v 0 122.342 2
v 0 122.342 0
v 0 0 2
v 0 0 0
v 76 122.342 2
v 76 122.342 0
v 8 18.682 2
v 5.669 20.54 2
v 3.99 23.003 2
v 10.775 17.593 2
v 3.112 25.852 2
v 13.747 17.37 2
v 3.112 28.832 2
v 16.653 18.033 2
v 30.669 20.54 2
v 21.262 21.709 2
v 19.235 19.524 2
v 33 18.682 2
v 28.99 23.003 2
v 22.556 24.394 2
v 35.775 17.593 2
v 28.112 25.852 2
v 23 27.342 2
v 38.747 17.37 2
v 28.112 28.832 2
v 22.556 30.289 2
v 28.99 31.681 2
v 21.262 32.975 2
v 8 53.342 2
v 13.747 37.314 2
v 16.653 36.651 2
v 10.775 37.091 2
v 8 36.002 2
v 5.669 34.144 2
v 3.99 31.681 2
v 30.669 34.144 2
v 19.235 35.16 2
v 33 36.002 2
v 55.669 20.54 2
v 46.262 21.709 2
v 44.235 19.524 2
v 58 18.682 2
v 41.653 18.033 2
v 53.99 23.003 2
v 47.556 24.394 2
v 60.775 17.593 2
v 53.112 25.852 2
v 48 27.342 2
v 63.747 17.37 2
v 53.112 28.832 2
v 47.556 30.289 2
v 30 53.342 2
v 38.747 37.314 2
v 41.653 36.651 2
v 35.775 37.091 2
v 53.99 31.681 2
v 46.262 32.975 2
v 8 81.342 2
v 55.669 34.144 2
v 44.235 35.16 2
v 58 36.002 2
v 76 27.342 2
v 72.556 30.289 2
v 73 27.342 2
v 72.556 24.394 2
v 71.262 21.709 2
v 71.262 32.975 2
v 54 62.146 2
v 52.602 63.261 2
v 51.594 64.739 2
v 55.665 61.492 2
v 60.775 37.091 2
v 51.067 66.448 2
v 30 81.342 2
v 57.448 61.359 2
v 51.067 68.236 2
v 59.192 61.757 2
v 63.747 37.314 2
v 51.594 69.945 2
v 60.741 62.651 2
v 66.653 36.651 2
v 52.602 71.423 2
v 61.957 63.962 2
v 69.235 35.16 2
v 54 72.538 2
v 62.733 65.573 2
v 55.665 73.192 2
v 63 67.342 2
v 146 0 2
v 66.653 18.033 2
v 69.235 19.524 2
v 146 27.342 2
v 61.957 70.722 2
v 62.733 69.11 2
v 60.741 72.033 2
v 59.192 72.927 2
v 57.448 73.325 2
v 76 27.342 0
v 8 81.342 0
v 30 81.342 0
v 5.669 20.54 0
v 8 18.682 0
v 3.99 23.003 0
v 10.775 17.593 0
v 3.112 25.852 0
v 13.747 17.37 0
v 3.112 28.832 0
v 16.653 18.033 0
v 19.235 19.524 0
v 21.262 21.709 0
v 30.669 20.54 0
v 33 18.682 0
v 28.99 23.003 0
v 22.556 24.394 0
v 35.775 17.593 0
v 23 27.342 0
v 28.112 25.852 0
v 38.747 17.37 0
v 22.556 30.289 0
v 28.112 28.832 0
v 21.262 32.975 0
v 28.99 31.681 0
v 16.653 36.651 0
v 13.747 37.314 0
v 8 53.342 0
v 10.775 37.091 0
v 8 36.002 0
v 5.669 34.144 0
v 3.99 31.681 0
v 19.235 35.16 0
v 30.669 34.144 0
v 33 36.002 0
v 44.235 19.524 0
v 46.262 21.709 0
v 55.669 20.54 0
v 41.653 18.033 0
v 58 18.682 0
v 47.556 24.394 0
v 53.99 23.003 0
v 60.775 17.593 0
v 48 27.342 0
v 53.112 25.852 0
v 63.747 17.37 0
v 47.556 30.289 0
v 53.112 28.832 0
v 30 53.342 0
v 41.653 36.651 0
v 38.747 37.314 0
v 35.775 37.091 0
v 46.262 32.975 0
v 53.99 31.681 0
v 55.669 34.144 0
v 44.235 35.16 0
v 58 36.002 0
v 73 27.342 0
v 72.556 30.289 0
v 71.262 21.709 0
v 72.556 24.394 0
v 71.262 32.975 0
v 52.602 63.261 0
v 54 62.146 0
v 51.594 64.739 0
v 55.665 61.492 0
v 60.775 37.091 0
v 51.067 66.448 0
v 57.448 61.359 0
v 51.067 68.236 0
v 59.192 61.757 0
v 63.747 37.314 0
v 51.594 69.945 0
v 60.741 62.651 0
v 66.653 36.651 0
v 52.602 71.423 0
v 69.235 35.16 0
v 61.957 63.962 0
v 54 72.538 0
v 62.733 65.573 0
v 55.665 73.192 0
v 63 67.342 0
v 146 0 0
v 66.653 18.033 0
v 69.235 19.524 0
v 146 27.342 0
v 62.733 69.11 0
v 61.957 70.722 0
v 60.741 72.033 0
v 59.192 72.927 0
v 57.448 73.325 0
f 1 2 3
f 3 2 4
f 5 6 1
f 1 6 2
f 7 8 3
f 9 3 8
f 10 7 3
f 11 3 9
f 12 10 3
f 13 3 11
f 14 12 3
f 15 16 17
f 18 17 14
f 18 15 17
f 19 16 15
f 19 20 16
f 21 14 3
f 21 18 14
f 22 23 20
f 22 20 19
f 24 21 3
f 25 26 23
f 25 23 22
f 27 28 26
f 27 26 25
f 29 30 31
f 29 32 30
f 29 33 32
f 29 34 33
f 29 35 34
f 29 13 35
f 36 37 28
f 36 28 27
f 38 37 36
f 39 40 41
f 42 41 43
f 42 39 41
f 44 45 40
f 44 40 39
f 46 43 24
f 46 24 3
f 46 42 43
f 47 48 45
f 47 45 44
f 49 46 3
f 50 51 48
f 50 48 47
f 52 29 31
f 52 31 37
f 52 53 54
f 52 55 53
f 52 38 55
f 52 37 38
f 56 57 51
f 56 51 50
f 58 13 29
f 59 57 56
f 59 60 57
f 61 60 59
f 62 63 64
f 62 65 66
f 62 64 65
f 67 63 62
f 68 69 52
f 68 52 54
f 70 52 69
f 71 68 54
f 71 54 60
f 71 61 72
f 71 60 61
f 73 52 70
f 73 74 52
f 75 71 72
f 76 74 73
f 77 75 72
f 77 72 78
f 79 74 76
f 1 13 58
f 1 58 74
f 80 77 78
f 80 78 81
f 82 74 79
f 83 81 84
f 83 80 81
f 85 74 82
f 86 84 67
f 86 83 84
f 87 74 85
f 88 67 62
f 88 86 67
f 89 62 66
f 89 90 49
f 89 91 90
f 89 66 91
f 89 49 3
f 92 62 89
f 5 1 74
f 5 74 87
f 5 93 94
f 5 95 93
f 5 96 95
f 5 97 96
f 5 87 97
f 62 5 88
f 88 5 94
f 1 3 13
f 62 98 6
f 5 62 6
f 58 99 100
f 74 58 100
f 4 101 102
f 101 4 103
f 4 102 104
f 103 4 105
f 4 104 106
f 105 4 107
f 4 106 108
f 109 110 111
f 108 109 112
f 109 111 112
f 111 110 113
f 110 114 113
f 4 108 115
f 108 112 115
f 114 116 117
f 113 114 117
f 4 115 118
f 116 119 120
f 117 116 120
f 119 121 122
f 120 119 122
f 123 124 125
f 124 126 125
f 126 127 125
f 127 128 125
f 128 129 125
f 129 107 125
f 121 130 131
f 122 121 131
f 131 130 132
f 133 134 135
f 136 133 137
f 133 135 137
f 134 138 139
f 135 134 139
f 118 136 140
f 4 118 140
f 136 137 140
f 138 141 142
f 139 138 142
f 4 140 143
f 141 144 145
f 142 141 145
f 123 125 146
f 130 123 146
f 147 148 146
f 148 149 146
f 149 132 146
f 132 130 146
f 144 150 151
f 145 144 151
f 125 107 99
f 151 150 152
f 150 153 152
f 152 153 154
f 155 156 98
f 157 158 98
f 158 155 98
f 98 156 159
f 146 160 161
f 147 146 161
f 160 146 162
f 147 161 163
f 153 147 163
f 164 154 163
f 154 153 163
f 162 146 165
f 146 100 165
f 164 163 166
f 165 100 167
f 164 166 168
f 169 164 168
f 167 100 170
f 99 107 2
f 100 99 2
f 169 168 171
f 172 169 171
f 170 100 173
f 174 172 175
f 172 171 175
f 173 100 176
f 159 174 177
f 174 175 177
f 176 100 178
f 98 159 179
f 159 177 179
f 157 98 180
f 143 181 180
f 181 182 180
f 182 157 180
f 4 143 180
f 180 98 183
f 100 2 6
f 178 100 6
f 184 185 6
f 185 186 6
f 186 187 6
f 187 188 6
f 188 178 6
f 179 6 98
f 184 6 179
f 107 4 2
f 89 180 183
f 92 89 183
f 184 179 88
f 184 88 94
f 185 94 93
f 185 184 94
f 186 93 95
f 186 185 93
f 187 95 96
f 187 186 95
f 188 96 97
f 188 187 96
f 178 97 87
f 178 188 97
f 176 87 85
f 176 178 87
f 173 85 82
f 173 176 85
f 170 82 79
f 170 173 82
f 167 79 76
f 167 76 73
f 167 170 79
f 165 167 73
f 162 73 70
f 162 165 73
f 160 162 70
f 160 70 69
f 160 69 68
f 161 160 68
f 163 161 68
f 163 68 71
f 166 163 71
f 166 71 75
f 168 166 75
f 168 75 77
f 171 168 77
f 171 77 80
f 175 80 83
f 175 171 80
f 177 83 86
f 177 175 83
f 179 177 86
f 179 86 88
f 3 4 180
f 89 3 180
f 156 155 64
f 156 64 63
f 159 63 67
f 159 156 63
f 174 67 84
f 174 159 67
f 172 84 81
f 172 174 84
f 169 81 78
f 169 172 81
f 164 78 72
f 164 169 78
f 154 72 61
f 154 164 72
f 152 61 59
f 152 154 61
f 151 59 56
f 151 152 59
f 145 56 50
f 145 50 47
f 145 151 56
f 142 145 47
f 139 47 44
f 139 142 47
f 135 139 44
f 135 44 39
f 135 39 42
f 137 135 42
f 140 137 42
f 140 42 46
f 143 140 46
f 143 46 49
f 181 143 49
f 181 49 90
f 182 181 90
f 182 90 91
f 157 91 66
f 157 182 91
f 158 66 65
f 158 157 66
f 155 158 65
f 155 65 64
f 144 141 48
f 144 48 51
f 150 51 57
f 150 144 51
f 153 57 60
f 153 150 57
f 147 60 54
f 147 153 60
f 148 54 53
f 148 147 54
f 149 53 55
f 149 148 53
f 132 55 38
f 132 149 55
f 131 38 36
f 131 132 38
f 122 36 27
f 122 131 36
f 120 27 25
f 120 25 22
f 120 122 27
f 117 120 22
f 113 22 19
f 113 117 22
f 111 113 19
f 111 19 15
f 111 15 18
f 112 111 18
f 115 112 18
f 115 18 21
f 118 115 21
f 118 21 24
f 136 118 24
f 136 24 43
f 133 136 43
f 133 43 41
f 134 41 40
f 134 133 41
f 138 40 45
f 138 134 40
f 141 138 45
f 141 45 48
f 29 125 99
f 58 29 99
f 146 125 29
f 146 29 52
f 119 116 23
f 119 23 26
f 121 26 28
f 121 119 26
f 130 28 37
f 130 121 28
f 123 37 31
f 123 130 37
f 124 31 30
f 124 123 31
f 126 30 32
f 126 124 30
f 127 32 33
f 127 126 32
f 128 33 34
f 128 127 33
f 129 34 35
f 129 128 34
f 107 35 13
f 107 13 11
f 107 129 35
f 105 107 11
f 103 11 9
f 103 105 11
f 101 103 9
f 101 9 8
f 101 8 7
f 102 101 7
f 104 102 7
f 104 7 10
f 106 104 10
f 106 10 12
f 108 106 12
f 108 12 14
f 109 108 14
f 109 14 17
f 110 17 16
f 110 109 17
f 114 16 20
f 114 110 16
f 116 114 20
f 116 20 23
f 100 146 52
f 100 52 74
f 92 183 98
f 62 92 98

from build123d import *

# Parameters (mm, degrees)
F0_R     = 10
F0_W     = 22
F0_H     = 28
F0_R_2   = 6
F1_DEPTH = 2


with BuildPart() as f1:
    # F0 (on Top) → F1 (new body)
    with BuildSketch(Plane.XY):
        Polygon((0, 0), (146, 0), (146, 27.341935), (76, 27.341935), (76, 122.341935), (38, 122.341935), (0, 122.341935), align=None)
        with Locations((13, 27.341935)):
            Circle(F0_R, mode=Mode.SUBTRACT)
        with Locations((38, 27.341935)):
            Circle(F0_R, mode=Mode.SUBTRACT)
        with Locations((63, 27.341935)):
            Circle(F0_R, mode=Mode.SUBTRACT)
        with Locations((19, 67.341935)):
            Rectangle(F0_W, F0_H, mode=Mode.SUBTRACT)
        with Locations((57, 67.341935)):
            Circle(F0_R_2, mode=Mode.SUBTRACT)
    extrude(amount=F1_DEPTH)


solid = f1.part
